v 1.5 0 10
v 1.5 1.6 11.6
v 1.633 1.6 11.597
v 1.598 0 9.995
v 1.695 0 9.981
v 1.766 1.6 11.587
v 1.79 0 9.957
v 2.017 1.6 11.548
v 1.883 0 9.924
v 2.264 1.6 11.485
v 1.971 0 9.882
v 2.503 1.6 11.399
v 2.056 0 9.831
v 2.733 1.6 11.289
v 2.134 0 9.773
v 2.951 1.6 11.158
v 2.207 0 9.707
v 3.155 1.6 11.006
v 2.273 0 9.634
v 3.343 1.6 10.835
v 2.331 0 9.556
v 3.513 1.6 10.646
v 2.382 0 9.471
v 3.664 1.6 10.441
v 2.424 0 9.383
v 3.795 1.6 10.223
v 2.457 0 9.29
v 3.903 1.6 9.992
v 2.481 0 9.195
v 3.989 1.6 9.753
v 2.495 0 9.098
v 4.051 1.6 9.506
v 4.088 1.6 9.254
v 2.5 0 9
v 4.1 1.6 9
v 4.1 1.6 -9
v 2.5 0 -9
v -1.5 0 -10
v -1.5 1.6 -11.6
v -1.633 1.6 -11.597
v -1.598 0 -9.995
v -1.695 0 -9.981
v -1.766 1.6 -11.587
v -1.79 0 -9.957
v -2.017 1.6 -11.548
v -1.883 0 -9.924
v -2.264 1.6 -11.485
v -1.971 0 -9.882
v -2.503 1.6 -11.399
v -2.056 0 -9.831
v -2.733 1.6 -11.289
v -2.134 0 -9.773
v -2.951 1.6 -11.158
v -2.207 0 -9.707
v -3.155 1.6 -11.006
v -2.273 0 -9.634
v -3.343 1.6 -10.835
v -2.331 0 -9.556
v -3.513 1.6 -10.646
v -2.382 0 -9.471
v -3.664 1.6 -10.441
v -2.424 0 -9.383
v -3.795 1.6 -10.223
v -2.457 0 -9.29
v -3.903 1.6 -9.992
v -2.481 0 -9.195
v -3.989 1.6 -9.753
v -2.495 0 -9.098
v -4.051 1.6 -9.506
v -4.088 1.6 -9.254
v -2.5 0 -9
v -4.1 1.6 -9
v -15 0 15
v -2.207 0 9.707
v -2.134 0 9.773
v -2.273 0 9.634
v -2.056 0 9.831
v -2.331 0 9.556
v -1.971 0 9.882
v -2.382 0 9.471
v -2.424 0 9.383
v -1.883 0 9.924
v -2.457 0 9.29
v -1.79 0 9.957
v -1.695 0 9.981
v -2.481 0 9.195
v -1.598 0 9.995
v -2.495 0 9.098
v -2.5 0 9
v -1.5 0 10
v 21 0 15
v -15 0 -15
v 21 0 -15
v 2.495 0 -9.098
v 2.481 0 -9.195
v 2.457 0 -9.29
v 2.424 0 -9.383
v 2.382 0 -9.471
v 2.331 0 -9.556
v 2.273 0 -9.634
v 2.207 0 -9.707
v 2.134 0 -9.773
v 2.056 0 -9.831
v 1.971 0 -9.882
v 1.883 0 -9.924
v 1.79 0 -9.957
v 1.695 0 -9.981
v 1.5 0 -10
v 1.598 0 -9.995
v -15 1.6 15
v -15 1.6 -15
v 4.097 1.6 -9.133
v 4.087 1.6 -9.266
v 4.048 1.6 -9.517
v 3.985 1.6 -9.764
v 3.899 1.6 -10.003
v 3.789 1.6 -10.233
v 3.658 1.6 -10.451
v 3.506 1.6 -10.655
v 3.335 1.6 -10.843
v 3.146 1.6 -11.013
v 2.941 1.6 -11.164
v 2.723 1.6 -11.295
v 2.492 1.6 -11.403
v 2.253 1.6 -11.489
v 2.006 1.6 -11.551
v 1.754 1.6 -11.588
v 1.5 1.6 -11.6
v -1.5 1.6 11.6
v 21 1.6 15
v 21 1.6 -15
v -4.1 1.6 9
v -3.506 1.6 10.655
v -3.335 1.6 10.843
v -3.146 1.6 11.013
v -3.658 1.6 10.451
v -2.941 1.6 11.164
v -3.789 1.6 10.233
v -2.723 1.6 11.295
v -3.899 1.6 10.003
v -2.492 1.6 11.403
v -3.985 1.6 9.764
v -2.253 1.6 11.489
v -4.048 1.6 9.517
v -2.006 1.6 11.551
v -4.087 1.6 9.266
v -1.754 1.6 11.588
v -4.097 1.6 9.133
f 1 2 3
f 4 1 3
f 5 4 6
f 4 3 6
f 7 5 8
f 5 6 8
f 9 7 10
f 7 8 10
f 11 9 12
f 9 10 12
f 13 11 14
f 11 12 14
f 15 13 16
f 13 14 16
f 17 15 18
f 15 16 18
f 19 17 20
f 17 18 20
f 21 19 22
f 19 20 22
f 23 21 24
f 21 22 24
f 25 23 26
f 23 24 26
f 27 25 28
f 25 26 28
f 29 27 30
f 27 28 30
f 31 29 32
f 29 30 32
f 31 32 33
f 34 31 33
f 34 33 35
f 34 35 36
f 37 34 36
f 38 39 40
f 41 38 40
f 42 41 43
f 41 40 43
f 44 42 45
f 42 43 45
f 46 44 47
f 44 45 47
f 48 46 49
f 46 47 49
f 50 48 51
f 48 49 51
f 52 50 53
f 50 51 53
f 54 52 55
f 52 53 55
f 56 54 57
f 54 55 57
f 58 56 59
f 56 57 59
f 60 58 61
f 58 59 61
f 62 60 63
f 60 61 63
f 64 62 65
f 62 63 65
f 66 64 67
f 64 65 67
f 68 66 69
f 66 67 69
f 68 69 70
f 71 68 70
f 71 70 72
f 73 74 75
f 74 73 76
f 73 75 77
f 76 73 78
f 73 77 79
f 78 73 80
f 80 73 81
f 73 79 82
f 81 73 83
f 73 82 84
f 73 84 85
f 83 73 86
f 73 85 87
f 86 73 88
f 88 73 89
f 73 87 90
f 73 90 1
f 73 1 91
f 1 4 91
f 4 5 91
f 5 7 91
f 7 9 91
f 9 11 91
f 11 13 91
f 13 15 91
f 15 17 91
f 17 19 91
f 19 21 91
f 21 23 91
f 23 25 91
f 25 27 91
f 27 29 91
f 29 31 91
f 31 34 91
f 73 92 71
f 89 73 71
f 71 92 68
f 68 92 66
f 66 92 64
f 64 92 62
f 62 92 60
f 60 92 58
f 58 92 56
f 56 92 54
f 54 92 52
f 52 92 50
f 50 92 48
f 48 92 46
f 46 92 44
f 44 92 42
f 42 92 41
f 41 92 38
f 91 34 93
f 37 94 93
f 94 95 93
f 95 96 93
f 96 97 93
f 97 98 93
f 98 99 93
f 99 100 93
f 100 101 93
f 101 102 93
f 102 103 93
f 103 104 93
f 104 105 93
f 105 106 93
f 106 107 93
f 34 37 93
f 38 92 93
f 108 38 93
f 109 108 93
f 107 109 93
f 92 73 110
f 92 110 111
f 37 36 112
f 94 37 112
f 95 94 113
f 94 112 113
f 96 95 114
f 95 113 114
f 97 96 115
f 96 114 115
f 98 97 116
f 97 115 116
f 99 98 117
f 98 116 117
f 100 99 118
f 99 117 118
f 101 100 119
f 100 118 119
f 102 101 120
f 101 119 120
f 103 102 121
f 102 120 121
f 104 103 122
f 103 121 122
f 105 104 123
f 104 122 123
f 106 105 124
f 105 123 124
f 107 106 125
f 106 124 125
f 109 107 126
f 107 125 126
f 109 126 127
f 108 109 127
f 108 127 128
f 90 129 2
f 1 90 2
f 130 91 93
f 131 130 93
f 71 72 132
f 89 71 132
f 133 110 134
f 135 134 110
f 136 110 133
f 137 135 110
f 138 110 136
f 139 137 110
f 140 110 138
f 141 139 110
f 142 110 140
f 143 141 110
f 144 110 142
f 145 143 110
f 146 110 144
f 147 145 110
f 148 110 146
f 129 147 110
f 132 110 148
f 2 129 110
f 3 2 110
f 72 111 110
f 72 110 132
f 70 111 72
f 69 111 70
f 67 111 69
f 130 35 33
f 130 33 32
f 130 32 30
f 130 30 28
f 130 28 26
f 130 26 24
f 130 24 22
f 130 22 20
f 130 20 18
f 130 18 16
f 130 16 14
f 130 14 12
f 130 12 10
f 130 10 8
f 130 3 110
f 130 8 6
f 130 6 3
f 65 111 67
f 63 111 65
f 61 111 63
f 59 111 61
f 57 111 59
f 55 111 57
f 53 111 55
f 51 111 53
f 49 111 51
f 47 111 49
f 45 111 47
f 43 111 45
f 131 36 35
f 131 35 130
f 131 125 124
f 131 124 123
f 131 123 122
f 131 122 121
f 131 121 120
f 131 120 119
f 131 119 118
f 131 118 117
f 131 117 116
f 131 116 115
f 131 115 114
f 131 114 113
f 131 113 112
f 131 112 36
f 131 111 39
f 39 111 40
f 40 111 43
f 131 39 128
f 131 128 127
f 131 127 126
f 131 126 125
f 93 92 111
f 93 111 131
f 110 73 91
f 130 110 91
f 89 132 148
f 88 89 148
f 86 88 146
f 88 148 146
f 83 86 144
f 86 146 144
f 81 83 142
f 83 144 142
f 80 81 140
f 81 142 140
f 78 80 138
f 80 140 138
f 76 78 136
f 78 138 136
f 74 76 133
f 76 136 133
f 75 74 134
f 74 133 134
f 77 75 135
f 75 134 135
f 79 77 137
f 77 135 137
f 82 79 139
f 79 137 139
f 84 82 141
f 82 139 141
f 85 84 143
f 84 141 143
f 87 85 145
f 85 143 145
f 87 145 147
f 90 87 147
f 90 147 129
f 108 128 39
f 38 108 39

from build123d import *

# Parameters (mm, degrees)
SKETCH2_W           = 36
SKETCH2_H           = 30
BOSS_EXTRUDE1_DEPTH = 1.6002
CUT_EXTRUDE4_DEPTH  = 2.6002
CUT_EXTRUDE4_TAPER  = -45


with BuildPart() as part:
    # Sketch2 → Boss-Extrude1 (new body)
    with BuildSketch(Plane(origin=(0, 0, 0), x_dir=(1, 0, 0), z_dir=(0, 1, 0))):
        with Locations((3, 0)):
            Rectangle(SKETCH2_W, SKETCH2_H)
    extrude(amount=BOSS_EXTRUDE1_DEPTH)

    # Sketch4 → Cut-Extrude4 (cut, through all)
    with BuildSketch(Plane(origin=(0, 0, 0), x_dir=(1, 0, 0), z_dir=(0, 1, 0))):
        with BuildLine():
            ThreePointArc((1.5, -10), (2.207106781, -9.707106781), (2.5, -9))
            Line((2.5, -9), (2.5, 9))
            ThreePointArc((2.5, 9), (2.207106781, 9.707106781), (1.5, 10))
            Line((1.5, 10), (-1.5, 10))
            ThreePointArc((-1.5, 10), (-2.207106781, 9.707106781), (-2.5, 9))
            Line((-2.5, 9), (-2.5, -9))
            ThreePointArc((-2.5, -9), (-2.207106781, -9.707106781), (-1.5, -10))
            Line((-1.5, -10), (1.5, -10))
        make_face()
    extrude(amount=CUT_EXTRUDE4_DEPTH, taper=CUT_EXTRUDE4_TAPER, mode=Mode.SUBTRACT)


solid = part.part
